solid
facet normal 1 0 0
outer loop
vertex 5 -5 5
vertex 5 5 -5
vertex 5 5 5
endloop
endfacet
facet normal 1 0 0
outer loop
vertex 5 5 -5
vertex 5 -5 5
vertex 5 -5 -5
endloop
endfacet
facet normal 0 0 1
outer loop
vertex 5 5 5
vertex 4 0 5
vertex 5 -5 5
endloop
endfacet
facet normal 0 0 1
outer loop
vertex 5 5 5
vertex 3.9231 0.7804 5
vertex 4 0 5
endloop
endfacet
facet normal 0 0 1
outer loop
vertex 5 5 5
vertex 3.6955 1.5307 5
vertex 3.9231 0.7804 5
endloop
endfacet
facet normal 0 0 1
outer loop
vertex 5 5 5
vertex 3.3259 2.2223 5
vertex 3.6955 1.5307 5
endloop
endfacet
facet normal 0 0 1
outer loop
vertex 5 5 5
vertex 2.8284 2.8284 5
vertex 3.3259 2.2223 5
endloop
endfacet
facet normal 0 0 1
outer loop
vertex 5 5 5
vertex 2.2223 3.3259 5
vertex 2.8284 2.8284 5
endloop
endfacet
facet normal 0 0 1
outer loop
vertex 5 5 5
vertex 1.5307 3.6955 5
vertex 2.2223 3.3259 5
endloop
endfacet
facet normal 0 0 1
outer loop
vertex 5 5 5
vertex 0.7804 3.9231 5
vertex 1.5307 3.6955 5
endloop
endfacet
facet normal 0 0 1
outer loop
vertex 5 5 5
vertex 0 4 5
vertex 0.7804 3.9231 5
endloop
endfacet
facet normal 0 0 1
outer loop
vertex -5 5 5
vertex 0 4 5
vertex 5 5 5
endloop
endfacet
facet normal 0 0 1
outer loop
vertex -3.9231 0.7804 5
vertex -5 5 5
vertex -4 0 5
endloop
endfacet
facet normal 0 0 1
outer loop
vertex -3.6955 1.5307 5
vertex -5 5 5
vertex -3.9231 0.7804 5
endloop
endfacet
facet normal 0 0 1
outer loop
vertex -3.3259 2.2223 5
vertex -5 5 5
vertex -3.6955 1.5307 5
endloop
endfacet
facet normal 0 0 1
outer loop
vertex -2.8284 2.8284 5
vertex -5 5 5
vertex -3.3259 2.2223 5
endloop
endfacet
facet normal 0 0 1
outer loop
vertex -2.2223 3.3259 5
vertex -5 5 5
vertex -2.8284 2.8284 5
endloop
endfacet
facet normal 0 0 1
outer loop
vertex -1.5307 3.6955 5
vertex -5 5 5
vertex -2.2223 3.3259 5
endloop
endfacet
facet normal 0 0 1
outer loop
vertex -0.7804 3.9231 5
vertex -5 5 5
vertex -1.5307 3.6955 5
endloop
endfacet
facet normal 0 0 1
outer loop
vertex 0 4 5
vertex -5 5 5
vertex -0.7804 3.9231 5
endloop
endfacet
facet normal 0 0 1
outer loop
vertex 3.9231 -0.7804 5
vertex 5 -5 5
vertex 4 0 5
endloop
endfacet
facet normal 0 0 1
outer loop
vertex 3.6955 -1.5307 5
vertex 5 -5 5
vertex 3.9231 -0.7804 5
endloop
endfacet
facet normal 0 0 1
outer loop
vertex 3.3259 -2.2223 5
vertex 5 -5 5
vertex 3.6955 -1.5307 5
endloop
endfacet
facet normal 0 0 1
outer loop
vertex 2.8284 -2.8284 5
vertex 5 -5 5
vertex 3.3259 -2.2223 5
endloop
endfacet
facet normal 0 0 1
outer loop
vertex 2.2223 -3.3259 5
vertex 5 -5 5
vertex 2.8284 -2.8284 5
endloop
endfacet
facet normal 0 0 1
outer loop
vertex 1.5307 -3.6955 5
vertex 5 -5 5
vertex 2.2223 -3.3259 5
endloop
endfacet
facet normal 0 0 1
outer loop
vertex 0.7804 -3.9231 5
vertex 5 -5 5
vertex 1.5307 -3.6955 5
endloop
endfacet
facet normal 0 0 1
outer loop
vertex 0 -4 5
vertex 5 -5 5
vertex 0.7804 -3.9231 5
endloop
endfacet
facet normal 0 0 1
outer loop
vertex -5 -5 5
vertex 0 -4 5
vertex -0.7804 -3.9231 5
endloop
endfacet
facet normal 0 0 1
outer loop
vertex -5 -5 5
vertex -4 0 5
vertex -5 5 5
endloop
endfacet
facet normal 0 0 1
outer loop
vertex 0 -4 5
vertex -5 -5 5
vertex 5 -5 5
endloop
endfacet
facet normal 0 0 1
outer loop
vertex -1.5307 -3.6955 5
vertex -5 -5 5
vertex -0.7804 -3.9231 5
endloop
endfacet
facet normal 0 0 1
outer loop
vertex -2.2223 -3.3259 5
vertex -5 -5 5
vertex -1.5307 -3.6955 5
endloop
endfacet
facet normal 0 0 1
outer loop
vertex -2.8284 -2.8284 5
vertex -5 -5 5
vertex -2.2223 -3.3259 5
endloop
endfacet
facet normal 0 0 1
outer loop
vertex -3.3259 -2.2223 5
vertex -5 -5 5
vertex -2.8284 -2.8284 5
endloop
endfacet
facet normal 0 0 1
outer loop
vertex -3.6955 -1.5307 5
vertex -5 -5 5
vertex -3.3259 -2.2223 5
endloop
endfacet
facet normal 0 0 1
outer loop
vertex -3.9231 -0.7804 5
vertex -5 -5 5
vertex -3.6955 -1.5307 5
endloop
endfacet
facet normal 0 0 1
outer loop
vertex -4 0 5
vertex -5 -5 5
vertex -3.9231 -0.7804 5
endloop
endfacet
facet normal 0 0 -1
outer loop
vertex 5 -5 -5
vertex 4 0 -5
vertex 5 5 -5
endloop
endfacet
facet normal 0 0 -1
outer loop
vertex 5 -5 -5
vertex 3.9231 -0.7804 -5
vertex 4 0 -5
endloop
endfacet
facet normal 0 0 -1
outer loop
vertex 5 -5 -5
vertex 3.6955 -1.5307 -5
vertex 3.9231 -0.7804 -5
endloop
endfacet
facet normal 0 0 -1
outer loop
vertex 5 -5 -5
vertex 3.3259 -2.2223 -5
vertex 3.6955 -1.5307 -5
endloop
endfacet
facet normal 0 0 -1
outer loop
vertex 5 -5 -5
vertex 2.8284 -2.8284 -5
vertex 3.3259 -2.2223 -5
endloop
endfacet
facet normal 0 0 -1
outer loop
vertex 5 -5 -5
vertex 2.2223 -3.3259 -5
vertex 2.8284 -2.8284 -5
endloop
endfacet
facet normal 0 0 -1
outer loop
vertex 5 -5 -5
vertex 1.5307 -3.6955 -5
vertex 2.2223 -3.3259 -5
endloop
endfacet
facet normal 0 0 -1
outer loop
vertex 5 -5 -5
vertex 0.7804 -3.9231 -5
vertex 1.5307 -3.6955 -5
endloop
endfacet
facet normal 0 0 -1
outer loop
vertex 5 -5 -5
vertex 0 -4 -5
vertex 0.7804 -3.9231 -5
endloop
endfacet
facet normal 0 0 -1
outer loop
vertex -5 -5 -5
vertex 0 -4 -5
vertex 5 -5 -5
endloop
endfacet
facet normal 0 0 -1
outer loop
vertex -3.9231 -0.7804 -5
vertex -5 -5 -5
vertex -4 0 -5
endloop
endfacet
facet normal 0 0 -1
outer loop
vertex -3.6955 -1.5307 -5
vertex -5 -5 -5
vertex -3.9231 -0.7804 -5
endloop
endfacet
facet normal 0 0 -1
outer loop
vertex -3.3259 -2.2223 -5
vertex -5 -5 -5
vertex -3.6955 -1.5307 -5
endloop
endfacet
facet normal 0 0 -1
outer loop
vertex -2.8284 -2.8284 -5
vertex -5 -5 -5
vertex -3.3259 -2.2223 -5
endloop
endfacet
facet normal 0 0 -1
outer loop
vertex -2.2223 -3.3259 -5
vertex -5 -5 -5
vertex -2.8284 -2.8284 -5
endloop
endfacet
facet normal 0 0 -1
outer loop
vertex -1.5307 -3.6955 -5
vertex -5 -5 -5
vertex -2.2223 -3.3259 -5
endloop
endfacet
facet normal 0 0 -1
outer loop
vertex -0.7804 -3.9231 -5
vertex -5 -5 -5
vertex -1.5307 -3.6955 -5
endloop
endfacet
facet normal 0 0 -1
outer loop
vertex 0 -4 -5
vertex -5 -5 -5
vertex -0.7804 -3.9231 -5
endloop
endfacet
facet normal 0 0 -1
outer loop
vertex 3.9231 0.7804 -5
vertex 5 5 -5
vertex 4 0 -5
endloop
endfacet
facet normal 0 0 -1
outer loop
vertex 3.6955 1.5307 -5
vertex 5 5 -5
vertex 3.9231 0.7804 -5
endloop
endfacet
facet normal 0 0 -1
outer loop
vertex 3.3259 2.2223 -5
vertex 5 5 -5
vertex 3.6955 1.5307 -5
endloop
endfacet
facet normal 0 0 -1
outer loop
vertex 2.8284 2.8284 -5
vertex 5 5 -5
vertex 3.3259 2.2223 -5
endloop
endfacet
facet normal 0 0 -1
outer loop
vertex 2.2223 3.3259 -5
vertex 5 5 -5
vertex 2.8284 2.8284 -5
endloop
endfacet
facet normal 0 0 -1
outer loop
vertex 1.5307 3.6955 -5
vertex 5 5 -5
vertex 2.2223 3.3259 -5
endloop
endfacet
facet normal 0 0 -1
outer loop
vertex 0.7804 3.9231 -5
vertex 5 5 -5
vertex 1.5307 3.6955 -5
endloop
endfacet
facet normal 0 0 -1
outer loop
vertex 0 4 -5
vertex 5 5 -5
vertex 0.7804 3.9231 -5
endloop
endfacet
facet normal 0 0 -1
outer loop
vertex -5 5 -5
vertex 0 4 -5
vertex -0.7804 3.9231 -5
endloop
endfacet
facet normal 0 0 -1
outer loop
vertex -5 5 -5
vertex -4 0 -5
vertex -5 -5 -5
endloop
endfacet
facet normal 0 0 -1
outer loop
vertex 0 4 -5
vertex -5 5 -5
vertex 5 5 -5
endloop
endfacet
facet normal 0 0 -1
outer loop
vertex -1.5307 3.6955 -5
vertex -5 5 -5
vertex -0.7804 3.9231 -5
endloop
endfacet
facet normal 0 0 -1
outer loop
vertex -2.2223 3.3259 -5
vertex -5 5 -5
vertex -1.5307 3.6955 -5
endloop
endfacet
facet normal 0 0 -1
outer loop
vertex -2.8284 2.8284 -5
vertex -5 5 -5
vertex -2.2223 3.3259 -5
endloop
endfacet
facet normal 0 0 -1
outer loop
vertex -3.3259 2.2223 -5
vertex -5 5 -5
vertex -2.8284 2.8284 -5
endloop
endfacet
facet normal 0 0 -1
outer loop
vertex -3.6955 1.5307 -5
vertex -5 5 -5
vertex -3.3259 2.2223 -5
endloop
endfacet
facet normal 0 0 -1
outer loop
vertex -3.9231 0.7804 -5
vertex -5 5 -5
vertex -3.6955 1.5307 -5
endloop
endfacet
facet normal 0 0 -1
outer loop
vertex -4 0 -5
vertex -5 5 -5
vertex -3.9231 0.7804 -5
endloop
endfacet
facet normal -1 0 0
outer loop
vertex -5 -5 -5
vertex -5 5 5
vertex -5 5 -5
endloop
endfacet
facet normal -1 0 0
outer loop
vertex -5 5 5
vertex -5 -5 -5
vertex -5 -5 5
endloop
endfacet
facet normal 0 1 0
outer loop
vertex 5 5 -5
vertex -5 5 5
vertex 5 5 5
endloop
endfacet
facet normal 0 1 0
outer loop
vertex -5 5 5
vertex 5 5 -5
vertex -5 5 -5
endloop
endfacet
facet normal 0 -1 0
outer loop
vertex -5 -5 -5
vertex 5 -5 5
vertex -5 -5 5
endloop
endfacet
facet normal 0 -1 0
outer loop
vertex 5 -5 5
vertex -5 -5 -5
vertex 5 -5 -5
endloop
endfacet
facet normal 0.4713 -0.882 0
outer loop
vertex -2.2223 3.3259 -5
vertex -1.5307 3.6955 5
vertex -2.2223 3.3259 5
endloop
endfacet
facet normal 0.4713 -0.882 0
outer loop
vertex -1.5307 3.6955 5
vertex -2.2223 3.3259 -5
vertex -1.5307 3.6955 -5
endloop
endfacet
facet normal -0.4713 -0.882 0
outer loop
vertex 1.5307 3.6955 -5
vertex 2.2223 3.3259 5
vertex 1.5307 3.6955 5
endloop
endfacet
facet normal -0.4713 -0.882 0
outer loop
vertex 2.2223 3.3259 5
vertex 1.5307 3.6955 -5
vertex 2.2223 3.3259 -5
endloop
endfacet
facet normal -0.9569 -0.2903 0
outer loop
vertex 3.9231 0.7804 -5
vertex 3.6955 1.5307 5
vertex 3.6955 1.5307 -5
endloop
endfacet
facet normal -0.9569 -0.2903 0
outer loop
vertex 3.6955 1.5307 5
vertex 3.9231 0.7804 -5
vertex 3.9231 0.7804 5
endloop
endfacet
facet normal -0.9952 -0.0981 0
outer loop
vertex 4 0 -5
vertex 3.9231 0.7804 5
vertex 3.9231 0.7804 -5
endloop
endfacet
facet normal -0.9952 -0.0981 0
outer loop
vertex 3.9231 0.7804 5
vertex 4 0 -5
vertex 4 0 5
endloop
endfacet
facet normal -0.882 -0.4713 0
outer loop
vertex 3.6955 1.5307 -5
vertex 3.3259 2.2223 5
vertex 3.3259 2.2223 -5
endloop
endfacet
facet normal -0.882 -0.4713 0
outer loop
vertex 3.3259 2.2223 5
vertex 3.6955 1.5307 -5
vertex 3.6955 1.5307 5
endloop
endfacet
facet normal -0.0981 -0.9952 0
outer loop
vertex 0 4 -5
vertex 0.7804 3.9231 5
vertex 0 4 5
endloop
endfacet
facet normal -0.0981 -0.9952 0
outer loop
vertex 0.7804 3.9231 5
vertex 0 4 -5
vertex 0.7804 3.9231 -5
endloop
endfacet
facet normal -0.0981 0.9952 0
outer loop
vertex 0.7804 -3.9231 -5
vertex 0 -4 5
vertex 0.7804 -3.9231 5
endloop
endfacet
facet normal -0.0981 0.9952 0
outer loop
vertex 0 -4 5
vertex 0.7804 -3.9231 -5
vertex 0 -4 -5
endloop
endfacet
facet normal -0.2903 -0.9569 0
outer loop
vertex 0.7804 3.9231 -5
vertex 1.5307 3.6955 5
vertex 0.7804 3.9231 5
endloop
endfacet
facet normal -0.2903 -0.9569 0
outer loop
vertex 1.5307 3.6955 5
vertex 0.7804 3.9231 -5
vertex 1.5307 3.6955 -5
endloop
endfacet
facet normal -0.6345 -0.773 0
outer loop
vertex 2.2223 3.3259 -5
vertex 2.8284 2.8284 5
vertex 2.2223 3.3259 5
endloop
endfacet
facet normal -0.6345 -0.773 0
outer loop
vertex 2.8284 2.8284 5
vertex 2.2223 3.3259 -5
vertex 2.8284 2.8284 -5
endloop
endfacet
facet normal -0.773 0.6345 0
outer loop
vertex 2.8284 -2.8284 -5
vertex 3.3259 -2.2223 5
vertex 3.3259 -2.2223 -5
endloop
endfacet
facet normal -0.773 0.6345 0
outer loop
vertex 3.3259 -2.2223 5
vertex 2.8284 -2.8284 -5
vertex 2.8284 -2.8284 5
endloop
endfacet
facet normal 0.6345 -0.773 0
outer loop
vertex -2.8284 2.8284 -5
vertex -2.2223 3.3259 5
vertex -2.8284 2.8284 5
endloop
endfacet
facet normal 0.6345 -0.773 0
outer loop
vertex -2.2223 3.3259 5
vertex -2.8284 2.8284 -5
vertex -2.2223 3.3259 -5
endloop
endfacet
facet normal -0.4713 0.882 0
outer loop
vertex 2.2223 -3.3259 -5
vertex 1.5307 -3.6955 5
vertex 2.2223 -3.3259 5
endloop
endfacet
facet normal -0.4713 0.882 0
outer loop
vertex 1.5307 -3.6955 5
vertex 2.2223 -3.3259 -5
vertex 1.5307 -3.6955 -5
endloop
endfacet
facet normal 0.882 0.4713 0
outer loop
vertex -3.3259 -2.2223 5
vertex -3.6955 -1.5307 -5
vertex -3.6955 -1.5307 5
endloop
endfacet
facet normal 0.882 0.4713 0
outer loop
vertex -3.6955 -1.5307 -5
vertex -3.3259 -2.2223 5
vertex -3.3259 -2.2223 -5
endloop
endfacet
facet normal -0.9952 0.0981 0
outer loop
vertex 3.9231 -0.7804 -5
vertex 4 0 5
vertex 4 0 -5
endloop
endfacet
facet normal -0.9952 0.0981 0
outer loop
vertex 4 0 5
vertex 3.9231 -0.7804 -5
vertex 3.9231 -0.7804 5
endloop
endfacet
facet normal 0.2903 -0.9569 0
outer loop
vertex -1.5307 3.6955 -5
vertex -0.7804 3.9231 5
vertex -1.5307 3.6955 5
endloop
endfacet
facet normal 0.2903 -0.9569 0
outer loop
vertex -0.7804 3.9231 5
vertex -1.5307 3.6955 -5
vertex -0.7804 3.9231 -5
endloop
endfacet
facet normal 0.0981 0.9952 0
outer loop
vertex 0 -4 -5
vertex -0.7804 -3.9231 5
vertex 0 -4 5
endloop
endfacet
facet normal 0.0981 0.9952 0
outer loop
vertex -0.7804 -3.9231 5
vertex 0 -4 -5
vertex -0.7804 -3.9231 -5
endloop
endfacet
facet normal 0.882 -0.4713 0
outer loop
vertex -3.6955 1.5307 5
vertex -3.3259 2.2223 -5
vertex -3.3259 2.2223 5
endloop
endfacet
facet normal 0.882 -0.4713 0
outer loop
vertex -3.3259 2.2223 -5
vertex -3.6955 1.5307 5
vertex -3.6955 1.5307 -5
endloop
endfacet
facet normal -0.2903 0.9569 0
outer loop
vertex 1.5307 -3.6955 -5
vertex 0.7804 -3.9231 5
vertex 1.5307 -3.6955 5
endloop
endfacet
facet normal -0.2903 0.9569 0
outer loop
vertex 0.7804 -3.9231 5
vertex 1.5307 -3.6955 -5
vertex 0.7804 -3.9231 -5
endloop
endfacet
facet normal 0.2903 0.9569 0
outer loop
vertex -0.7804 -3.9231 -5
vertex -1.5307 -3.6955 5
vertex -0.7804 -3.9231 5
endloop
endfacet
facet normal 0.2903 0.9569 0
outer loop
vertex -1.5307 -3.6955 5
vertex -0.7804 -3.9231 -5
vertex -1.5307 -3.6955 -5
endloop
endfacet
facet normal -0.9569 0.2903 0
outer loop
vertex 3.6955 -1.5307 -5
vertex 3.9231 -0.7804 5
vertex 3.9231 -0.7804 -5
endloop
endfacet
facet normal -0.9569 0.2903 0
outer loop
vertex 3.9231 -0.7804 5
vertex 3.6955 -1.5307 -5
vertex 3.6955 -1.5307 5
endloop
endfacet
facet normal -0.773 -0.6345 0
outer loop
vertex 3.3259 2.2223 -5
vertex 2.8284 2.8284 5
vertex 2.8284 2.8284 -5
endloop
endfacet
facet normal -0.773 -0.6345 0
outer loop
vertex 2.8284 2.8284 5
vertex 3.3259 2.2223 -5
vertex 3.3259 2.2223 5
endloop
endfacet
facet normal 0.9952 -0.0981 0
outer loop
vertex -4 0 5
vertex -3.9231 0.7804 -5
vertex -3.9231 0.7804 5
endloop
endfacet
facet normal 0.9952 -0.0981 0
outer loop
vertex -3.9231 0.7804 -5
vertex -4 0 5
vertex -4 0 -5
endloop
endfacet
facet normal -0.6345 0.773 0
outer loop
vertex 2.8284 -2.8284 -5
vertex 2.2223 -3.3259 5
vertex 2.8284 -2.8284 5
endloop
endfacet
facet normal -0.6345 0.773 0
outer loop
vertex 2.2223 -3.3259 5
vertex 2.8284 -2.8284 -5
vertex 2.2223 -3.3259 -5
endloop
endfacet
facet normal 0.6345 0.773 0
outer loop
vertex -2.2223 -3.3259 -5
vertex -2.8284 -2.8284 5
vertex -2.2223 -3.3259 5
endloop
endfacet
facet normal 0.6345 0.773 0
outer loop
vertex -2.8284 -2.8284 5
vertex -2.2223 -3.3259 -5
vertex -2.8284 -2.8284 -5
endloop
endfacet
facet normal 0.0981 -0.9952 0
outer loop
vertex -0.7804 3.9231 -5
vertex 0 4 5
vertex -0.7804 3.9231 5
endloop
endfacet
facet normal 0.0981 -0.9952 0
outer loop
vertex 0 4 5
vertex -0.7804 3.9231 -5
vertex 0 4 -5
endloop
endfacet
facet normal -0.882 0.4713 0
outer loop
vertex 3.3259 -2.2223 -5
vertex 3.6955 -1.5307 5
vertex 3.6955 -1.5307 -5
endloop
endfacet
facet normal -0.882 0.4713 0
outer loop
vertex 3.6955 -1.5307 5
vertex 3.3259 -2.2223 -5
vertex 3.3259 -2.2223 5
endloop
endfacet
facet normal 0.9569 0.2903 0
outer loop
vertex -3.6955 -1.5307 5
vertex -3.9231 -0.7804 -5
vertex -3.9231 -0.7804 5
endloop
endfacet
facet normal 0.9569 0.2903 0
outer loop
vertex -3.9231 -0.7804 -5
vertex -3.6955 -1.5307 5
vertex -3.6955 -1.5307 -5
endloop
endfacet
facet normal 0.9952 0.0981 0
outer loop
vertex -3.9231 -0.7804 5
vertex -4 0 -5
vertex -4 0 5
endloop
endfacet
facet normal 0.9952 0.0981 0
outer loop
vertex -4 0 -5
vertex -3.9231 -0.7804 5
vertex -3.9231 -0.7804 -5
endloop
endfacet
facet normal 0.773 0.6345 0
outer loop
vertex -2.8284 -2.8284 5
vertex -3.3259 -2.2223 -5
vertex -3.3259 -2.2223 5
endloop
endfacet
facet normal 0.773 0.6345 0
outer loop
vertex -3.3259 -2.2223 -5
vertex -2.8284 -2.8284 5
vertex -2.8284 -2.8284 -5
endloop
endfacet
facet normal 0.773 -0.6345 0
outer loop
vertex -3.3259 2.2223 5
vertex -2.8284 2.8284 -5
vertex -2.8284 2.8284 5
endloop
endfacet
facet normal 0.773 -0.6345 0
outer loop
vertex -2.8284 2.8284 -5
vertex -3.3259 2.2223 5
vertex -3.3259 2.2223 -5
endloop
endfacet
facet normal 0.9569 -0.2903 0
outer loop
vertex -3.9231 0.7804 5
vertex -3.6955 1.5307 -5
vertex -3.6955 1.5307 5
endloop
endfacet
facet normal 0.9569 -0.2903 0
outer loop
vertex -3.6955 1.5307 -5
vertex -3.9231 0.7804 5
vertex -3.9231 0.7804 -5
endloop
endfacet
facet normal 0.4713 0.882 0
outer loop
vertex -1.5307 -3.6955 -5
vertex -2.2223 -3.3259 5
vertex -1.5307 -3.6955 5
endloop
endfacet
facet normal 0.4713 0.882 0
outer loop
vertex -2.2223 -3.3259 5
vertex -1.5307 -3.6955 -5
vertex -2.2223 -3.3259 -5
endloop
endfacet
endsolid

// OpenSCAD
// OpenSCAD: basic boolean demo
// A cube with a cylindrical hole — same as basic_shapes.js, in SCAD.

difference() {
  cube([10, 10, 10], center=true);
  cylinder(h=12, r=4, center=true, $fn=32);
}
